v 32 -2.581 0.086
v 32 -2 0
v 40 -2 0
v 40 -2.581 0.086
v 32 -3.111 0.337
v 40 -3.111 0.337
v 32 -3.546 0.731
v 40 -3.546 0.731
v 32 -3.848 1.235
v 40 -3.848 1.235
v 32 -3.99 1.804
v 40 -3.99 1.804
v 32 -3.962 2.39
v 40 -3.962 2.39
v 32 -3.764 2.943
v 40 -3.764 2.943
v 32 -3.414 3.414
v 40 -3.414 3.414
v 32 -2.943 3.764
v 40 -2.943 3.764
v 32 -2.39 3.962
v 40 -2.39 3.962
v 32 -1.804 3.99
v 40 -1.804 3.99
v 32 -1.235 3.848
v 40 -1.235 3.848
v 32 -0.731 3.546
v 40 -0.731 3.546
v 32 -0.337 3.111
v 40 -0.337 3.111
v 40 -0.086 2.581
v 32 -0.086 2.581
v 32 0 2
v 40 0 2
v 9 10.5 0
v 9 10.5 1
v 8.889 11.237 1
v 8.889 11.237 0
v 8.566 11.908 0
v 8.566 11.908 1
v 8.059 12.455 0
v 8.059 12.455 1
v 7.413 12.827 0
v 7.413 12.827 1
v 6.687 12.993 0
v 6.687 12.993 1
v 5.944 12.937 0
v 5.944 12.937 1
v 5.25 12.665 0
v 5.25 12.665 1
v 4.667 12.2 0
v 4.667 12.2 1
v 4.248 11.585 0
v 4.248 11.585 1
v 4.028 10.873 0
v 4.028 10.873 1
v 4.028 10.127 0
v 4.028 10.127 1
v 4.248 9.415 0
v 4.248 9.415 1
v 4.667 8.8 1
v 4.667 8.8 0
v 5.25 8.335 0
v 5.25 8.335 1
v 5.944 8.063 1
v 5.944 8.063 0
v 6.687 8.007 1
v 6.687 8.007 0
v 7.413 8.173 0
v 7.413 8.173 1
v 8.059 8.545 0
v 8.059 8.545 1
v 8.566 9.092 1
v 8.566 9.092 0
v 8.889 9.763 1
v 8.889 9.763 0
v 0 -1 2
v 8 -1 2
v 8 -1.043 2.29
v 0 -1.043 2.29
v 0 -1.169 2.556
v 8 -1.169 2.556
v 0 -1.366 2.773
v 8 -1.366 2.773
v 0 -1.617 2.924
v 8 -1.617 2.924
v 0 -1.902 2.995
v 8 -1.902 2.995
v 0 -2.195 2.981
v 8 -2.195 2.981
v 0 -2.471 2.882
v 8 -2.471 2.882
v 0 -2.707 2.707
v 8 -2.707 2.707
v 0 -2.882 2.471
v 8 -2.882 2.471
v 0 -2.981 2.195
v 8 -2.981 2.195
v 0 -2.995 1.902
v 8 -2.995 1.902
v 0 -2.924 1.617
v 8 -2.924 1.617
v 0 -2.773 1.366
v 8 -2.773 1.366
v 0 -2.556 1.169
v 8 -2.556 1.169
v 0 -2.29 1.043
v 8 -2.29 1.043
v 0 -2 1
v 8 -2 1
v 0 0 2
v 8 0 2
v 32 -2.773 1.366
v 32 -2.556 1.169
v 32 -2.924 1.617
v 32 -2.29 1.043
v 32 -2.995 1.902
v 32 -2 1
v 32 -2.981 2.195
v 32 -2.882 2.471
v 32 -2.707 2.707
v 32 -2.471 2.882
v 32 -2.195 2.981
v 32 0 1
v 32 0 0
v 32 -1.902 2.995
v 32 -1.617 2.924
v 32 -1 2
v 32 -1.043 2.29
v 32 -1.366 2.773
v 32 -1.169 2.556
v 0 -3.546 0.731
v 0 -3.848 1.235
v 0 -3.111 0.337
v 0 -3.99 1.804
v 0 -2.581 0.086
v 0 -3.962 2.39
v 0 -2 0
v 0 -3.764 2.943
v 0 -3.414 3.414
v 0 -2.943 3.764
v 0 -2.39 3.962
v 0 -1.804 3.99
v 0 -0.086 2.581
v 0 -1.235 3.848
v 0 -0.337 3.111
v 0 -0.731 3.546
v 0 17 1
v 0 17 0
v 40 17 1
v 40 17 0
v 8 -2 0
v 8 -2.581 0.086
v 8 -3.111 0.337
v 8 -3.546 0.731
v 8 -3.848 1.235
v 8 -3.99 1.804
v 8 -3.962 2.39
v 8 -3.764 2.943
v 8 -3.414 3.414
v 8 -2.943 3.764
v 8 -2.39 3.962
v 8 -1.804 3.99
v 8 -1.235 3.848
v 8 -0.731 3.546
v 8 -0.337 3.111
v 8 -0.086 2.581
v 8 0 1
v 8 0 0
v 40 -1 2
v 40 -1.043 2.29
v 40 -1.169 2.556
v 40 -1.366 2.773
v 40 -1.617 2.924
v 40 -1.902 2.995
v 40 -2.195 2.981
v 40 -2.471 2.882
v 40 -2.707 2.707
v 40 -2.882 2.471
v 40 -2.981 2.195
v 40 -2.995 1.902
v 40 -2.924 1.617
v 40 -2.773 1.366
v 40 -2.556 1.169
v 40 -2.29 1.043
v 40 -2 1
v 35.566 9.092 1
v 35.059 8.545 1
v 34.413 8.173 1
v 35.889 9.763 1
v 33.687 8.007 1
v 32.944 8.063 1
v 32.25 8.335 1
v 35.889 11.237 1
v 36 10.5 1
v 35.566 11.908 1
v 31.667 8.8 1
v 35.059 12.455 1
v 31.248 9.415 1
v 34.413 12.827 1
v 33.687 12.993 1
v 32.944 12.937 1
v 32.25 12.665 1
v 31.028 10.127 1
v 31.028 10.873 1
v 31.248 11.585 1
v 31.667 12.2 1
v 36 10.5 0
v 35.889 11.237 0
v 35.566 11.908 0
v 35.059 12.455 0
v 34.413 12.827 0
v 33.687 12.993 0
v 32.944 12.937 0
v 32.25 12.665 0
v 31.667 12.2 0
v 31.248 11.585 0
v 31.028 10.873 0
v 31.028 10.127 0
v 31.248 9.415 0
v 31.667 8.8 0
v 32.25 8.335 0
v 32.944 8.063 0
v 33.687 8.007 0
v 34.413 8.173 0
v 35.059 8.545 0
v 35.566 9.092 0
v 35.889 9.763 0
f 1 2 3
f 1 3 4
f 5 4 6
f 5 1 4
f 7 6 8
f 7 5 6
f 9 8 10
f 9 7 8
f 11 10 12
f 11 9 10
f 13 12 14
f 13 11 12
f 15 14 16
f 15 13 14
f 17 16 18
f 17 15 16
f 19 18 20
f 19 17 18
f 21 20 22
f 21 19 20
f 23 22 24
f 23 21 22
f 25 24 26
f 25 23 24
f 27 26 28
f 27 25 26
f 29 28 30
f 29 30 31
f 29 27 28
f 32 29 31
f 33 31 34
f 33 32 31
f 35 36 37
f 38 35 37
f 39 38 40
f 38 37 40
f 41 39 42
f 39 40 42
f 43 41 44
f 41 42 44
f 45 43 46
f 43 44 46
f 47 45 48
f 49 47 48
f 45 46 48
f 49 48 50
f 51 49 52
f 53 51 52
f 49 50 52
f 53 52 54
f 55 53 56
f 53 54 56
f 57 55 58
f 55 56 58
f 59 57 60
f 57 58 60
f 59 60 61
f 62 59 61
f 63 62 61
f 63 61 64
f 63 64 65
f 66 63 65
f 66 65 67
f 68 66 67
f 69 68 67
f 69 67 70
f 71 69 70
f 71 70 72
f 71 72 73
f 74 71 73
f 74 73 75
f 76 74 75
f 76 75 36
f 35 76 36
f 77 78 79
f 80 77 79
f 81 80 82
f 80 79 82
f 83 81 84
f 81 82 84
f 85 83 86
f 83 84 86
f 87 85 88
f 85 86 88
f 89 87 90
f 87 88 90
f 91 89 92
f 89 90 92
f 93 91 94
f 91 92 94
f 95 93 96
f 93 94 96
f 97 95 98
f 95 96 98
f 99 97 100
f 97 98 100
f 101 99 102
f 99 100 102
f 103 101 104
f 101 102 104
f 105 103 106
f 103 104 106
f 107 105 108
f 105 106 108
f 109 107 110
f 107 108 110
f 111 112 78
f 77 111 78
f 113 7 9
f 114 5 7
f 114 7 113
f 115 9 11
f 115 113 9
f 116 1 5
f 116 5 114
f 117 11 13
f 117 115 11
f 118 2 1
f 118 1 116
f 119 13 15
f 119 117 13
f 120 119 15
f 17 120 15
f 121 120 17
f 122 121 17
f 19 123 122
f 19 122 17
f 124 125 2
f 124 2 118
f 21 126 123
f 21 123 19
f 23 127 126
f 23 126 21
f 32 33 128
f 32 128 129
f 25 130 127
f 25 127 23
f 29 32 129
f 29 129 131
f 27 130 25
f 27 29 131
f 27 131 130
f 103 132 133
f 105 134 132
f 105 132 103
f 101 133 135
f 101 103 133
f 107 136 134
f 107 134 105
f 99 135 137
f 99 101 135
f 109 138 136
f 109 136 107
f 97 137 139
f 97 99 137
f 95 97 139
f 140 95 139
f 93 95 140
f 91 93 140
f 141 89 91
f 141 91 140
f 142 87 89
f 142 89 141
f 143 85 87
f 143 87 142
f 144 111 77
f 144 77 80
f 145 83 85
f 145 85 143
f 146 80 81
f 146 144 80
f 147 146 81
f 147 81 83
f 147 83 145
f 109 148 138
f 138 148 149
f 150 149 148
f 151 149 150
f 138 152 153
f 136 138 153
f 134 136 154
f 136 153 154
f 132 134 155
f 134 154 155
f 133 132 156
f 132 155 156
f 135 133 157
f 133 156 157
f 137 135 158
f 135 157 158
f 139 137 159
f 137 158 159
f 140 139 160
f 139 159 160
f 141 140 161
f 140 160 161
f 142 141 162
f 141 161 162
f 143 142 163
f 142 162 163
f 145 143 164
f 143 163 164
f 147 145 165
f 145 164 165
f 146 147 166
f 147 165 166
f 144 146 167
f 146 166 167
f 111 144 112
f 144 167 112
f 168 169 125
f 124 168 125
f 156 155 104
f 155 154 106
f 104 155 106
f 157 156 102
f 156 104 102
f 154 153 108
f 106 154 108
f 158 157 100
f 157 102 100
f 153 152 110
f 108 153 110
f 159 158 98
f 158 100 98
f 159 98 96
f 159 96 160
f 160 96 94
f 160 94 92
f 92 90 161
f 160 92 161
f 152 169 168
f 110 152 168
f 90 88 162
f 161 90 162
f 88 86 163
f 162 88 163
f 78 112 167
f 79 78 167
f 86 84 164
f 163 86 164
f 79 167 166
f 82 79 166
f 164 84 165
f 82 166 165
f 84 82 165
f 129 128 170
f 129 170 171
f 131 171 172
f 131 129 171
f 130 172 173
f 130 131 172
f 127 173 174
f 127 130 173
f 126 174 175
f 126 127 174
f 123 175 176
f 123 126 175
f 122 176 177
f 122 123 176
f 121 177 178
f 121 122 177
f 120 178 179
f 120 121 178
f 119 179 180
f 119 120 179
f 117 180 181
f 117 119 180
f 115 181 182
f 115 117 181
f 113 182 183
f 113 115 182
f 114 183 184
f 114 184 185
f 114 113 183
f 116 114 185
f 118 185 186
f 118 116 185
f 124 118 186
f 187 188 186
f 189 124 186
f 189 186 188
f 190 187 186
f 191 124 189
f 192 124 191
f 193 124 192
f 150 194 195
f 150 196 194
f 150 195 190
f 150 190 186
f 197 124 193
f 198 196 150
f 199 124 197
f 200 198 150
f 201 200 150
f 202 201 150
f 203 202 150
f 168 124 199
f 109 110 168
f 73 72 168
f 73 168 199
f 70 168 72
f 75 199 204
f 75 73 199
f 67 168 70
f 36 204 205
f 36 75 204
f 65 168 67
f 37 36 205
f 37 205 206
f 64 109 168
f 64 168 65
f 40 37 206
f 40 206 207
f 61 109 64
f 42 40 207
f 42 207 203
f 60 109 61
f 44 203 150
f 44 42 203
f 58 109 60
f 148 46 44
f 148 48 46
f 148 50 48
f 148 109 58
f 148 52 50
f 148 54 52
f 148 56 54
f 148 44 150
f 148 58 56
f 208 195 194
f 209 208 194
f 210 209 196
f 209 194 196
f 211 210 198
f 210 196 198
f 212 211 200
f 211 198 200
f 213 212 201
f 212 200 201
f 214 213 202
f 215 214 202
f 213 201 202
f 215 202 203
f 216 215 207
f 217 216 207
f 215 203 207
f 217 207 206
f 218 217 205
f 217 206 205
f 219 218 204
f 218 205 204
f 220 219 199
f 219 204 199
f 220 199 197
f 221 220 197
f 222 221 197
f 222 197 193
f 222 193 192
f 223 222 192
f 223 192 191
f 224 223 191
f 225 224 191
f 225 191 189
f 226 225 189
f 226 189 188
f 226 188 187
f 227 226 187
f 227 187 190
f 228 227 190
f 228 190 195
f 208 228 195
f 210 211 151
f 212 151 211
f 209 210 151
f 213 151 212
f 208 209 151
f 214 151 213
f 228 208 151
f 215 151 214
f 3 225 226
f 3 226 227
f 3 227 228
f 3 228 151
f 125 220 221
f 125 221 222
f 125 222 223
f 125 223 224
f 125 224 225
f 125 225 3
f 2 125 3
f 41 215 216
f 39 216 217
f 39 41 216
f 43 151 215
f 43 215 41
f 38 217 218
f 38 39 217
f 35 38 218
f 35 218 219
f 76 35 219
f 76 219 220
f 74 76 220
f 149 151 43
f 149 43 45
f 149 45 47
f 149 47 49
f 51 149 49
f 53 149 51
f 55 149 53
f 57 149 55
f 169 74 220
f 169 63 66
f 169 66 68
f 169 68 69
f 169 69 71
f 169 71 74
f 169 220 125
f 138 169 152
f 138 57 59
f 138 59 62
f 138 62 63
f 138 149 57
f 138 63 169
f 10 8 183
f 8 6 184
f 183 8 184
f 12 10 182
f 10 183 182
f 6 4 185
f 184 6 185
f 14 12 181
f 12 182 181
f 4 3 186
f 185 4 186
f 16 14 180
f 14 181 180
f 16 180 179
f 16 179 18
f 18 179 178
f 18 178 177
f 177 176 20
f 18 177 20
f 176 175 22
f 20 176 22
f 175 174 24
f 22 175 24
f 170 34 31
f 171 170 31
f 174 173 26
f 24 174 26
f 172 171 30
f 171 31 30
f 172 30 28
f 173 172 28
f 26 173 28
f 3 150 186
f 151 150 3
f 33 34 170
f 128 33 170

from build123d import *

# Parameters (mm, degrees)
ESQUISSE1_W             = 40
ESQUISSE1_H             = 17
BOSS_EXTRU_1_DEPTH      = 1
ENL_V_MAT_EXTRU_1_REACH = 45.474
ESQUISSE2_R             = 2.5
BOSS_EXTRU_2_DEPTH      = 8


with BuildPart() as part:
    # Esquisse1 → Boss.-Extru.1 (new body)
    with BuildSketch(Plane.XY):
        with Locations((20, 8.5)):
            Rectangle(ESQUISSE1_W, ESQUISSE1_H)
    extrude(amount=BOSS_EXTRU_1_DEPTH)

    # Esquisse2 → Enlèv. mat.-Extru.1 (cut, up to next)
    with BuildSketch(Plane.XY.offset(1), mode=Mode.PRIVATE) as enl_v_mat_extru_1_sk1:
        with Locations((6.5, 10.5)):
            Circle(ESQUISSE2_R)
    enl_v_mat_extru_1_tool1 = extrude(enl_v_mat_extru_1_sk1.sketch, amount=-ENL_V_MAT_EXTRU_1_REACH, mode=Mode.PRIVATE) & part.part
    # Esquisse2 → Enlèv. mat.-Extru.1 (cut, up to next)
    with BuildSketch(Plane.XY.offset(1), mode=Mode.PRIVATE) as enl_v_mat_extru_1_sk2:
        with Locations((33.5, 10.5)):
            Circle(ESQUISSE2_R)
    enl_v_mat_extru_1_tool2 = extrude(enl_v_mat_extru_1_sk2.sketch, amount=-ENL_V_MAT_EXTRU_1_REACH, mode=Mode.PRIVATE) & part.part
    add(enl_v_mat_extru_1_tool1.solids().sort_by_distance((6.5, 10.5, 1))[0], mode=Mode.SUBTRACT)
    add(enl_v_mat_extru_1_tool2.solids().sort_by_distance((33.5, 10.5, 1))[0], mode=Mode.SUBTRACT)

    # Esquisse3 → Boss.-Extru.2 (add)
    with BuildSketch(Plane.ZY.offset(-8)):
        with BuildLine():
            Line((0, 0), (0, -2))
            ThreePointArc((0, -2), (3.414213562, -3.414213562), (2, 0))
            Line((2, 0), (2, -1))
            ThreePointArc((2, -1), (2.707106781, -2.707106781), (1, -2))
            Line((1, -2), (1, 0))
            Line((1, 0), (0, 0))
        make_face()
    boss_extru_2 = extrude(amount=BOSS_EXTRU_2_DEPTH)

    # Symétrie1: Boss.-Extru.2 across plane
    add(boss_extru_2.mirror(Plane.ZY.offset(-20)))


solid = part.part
